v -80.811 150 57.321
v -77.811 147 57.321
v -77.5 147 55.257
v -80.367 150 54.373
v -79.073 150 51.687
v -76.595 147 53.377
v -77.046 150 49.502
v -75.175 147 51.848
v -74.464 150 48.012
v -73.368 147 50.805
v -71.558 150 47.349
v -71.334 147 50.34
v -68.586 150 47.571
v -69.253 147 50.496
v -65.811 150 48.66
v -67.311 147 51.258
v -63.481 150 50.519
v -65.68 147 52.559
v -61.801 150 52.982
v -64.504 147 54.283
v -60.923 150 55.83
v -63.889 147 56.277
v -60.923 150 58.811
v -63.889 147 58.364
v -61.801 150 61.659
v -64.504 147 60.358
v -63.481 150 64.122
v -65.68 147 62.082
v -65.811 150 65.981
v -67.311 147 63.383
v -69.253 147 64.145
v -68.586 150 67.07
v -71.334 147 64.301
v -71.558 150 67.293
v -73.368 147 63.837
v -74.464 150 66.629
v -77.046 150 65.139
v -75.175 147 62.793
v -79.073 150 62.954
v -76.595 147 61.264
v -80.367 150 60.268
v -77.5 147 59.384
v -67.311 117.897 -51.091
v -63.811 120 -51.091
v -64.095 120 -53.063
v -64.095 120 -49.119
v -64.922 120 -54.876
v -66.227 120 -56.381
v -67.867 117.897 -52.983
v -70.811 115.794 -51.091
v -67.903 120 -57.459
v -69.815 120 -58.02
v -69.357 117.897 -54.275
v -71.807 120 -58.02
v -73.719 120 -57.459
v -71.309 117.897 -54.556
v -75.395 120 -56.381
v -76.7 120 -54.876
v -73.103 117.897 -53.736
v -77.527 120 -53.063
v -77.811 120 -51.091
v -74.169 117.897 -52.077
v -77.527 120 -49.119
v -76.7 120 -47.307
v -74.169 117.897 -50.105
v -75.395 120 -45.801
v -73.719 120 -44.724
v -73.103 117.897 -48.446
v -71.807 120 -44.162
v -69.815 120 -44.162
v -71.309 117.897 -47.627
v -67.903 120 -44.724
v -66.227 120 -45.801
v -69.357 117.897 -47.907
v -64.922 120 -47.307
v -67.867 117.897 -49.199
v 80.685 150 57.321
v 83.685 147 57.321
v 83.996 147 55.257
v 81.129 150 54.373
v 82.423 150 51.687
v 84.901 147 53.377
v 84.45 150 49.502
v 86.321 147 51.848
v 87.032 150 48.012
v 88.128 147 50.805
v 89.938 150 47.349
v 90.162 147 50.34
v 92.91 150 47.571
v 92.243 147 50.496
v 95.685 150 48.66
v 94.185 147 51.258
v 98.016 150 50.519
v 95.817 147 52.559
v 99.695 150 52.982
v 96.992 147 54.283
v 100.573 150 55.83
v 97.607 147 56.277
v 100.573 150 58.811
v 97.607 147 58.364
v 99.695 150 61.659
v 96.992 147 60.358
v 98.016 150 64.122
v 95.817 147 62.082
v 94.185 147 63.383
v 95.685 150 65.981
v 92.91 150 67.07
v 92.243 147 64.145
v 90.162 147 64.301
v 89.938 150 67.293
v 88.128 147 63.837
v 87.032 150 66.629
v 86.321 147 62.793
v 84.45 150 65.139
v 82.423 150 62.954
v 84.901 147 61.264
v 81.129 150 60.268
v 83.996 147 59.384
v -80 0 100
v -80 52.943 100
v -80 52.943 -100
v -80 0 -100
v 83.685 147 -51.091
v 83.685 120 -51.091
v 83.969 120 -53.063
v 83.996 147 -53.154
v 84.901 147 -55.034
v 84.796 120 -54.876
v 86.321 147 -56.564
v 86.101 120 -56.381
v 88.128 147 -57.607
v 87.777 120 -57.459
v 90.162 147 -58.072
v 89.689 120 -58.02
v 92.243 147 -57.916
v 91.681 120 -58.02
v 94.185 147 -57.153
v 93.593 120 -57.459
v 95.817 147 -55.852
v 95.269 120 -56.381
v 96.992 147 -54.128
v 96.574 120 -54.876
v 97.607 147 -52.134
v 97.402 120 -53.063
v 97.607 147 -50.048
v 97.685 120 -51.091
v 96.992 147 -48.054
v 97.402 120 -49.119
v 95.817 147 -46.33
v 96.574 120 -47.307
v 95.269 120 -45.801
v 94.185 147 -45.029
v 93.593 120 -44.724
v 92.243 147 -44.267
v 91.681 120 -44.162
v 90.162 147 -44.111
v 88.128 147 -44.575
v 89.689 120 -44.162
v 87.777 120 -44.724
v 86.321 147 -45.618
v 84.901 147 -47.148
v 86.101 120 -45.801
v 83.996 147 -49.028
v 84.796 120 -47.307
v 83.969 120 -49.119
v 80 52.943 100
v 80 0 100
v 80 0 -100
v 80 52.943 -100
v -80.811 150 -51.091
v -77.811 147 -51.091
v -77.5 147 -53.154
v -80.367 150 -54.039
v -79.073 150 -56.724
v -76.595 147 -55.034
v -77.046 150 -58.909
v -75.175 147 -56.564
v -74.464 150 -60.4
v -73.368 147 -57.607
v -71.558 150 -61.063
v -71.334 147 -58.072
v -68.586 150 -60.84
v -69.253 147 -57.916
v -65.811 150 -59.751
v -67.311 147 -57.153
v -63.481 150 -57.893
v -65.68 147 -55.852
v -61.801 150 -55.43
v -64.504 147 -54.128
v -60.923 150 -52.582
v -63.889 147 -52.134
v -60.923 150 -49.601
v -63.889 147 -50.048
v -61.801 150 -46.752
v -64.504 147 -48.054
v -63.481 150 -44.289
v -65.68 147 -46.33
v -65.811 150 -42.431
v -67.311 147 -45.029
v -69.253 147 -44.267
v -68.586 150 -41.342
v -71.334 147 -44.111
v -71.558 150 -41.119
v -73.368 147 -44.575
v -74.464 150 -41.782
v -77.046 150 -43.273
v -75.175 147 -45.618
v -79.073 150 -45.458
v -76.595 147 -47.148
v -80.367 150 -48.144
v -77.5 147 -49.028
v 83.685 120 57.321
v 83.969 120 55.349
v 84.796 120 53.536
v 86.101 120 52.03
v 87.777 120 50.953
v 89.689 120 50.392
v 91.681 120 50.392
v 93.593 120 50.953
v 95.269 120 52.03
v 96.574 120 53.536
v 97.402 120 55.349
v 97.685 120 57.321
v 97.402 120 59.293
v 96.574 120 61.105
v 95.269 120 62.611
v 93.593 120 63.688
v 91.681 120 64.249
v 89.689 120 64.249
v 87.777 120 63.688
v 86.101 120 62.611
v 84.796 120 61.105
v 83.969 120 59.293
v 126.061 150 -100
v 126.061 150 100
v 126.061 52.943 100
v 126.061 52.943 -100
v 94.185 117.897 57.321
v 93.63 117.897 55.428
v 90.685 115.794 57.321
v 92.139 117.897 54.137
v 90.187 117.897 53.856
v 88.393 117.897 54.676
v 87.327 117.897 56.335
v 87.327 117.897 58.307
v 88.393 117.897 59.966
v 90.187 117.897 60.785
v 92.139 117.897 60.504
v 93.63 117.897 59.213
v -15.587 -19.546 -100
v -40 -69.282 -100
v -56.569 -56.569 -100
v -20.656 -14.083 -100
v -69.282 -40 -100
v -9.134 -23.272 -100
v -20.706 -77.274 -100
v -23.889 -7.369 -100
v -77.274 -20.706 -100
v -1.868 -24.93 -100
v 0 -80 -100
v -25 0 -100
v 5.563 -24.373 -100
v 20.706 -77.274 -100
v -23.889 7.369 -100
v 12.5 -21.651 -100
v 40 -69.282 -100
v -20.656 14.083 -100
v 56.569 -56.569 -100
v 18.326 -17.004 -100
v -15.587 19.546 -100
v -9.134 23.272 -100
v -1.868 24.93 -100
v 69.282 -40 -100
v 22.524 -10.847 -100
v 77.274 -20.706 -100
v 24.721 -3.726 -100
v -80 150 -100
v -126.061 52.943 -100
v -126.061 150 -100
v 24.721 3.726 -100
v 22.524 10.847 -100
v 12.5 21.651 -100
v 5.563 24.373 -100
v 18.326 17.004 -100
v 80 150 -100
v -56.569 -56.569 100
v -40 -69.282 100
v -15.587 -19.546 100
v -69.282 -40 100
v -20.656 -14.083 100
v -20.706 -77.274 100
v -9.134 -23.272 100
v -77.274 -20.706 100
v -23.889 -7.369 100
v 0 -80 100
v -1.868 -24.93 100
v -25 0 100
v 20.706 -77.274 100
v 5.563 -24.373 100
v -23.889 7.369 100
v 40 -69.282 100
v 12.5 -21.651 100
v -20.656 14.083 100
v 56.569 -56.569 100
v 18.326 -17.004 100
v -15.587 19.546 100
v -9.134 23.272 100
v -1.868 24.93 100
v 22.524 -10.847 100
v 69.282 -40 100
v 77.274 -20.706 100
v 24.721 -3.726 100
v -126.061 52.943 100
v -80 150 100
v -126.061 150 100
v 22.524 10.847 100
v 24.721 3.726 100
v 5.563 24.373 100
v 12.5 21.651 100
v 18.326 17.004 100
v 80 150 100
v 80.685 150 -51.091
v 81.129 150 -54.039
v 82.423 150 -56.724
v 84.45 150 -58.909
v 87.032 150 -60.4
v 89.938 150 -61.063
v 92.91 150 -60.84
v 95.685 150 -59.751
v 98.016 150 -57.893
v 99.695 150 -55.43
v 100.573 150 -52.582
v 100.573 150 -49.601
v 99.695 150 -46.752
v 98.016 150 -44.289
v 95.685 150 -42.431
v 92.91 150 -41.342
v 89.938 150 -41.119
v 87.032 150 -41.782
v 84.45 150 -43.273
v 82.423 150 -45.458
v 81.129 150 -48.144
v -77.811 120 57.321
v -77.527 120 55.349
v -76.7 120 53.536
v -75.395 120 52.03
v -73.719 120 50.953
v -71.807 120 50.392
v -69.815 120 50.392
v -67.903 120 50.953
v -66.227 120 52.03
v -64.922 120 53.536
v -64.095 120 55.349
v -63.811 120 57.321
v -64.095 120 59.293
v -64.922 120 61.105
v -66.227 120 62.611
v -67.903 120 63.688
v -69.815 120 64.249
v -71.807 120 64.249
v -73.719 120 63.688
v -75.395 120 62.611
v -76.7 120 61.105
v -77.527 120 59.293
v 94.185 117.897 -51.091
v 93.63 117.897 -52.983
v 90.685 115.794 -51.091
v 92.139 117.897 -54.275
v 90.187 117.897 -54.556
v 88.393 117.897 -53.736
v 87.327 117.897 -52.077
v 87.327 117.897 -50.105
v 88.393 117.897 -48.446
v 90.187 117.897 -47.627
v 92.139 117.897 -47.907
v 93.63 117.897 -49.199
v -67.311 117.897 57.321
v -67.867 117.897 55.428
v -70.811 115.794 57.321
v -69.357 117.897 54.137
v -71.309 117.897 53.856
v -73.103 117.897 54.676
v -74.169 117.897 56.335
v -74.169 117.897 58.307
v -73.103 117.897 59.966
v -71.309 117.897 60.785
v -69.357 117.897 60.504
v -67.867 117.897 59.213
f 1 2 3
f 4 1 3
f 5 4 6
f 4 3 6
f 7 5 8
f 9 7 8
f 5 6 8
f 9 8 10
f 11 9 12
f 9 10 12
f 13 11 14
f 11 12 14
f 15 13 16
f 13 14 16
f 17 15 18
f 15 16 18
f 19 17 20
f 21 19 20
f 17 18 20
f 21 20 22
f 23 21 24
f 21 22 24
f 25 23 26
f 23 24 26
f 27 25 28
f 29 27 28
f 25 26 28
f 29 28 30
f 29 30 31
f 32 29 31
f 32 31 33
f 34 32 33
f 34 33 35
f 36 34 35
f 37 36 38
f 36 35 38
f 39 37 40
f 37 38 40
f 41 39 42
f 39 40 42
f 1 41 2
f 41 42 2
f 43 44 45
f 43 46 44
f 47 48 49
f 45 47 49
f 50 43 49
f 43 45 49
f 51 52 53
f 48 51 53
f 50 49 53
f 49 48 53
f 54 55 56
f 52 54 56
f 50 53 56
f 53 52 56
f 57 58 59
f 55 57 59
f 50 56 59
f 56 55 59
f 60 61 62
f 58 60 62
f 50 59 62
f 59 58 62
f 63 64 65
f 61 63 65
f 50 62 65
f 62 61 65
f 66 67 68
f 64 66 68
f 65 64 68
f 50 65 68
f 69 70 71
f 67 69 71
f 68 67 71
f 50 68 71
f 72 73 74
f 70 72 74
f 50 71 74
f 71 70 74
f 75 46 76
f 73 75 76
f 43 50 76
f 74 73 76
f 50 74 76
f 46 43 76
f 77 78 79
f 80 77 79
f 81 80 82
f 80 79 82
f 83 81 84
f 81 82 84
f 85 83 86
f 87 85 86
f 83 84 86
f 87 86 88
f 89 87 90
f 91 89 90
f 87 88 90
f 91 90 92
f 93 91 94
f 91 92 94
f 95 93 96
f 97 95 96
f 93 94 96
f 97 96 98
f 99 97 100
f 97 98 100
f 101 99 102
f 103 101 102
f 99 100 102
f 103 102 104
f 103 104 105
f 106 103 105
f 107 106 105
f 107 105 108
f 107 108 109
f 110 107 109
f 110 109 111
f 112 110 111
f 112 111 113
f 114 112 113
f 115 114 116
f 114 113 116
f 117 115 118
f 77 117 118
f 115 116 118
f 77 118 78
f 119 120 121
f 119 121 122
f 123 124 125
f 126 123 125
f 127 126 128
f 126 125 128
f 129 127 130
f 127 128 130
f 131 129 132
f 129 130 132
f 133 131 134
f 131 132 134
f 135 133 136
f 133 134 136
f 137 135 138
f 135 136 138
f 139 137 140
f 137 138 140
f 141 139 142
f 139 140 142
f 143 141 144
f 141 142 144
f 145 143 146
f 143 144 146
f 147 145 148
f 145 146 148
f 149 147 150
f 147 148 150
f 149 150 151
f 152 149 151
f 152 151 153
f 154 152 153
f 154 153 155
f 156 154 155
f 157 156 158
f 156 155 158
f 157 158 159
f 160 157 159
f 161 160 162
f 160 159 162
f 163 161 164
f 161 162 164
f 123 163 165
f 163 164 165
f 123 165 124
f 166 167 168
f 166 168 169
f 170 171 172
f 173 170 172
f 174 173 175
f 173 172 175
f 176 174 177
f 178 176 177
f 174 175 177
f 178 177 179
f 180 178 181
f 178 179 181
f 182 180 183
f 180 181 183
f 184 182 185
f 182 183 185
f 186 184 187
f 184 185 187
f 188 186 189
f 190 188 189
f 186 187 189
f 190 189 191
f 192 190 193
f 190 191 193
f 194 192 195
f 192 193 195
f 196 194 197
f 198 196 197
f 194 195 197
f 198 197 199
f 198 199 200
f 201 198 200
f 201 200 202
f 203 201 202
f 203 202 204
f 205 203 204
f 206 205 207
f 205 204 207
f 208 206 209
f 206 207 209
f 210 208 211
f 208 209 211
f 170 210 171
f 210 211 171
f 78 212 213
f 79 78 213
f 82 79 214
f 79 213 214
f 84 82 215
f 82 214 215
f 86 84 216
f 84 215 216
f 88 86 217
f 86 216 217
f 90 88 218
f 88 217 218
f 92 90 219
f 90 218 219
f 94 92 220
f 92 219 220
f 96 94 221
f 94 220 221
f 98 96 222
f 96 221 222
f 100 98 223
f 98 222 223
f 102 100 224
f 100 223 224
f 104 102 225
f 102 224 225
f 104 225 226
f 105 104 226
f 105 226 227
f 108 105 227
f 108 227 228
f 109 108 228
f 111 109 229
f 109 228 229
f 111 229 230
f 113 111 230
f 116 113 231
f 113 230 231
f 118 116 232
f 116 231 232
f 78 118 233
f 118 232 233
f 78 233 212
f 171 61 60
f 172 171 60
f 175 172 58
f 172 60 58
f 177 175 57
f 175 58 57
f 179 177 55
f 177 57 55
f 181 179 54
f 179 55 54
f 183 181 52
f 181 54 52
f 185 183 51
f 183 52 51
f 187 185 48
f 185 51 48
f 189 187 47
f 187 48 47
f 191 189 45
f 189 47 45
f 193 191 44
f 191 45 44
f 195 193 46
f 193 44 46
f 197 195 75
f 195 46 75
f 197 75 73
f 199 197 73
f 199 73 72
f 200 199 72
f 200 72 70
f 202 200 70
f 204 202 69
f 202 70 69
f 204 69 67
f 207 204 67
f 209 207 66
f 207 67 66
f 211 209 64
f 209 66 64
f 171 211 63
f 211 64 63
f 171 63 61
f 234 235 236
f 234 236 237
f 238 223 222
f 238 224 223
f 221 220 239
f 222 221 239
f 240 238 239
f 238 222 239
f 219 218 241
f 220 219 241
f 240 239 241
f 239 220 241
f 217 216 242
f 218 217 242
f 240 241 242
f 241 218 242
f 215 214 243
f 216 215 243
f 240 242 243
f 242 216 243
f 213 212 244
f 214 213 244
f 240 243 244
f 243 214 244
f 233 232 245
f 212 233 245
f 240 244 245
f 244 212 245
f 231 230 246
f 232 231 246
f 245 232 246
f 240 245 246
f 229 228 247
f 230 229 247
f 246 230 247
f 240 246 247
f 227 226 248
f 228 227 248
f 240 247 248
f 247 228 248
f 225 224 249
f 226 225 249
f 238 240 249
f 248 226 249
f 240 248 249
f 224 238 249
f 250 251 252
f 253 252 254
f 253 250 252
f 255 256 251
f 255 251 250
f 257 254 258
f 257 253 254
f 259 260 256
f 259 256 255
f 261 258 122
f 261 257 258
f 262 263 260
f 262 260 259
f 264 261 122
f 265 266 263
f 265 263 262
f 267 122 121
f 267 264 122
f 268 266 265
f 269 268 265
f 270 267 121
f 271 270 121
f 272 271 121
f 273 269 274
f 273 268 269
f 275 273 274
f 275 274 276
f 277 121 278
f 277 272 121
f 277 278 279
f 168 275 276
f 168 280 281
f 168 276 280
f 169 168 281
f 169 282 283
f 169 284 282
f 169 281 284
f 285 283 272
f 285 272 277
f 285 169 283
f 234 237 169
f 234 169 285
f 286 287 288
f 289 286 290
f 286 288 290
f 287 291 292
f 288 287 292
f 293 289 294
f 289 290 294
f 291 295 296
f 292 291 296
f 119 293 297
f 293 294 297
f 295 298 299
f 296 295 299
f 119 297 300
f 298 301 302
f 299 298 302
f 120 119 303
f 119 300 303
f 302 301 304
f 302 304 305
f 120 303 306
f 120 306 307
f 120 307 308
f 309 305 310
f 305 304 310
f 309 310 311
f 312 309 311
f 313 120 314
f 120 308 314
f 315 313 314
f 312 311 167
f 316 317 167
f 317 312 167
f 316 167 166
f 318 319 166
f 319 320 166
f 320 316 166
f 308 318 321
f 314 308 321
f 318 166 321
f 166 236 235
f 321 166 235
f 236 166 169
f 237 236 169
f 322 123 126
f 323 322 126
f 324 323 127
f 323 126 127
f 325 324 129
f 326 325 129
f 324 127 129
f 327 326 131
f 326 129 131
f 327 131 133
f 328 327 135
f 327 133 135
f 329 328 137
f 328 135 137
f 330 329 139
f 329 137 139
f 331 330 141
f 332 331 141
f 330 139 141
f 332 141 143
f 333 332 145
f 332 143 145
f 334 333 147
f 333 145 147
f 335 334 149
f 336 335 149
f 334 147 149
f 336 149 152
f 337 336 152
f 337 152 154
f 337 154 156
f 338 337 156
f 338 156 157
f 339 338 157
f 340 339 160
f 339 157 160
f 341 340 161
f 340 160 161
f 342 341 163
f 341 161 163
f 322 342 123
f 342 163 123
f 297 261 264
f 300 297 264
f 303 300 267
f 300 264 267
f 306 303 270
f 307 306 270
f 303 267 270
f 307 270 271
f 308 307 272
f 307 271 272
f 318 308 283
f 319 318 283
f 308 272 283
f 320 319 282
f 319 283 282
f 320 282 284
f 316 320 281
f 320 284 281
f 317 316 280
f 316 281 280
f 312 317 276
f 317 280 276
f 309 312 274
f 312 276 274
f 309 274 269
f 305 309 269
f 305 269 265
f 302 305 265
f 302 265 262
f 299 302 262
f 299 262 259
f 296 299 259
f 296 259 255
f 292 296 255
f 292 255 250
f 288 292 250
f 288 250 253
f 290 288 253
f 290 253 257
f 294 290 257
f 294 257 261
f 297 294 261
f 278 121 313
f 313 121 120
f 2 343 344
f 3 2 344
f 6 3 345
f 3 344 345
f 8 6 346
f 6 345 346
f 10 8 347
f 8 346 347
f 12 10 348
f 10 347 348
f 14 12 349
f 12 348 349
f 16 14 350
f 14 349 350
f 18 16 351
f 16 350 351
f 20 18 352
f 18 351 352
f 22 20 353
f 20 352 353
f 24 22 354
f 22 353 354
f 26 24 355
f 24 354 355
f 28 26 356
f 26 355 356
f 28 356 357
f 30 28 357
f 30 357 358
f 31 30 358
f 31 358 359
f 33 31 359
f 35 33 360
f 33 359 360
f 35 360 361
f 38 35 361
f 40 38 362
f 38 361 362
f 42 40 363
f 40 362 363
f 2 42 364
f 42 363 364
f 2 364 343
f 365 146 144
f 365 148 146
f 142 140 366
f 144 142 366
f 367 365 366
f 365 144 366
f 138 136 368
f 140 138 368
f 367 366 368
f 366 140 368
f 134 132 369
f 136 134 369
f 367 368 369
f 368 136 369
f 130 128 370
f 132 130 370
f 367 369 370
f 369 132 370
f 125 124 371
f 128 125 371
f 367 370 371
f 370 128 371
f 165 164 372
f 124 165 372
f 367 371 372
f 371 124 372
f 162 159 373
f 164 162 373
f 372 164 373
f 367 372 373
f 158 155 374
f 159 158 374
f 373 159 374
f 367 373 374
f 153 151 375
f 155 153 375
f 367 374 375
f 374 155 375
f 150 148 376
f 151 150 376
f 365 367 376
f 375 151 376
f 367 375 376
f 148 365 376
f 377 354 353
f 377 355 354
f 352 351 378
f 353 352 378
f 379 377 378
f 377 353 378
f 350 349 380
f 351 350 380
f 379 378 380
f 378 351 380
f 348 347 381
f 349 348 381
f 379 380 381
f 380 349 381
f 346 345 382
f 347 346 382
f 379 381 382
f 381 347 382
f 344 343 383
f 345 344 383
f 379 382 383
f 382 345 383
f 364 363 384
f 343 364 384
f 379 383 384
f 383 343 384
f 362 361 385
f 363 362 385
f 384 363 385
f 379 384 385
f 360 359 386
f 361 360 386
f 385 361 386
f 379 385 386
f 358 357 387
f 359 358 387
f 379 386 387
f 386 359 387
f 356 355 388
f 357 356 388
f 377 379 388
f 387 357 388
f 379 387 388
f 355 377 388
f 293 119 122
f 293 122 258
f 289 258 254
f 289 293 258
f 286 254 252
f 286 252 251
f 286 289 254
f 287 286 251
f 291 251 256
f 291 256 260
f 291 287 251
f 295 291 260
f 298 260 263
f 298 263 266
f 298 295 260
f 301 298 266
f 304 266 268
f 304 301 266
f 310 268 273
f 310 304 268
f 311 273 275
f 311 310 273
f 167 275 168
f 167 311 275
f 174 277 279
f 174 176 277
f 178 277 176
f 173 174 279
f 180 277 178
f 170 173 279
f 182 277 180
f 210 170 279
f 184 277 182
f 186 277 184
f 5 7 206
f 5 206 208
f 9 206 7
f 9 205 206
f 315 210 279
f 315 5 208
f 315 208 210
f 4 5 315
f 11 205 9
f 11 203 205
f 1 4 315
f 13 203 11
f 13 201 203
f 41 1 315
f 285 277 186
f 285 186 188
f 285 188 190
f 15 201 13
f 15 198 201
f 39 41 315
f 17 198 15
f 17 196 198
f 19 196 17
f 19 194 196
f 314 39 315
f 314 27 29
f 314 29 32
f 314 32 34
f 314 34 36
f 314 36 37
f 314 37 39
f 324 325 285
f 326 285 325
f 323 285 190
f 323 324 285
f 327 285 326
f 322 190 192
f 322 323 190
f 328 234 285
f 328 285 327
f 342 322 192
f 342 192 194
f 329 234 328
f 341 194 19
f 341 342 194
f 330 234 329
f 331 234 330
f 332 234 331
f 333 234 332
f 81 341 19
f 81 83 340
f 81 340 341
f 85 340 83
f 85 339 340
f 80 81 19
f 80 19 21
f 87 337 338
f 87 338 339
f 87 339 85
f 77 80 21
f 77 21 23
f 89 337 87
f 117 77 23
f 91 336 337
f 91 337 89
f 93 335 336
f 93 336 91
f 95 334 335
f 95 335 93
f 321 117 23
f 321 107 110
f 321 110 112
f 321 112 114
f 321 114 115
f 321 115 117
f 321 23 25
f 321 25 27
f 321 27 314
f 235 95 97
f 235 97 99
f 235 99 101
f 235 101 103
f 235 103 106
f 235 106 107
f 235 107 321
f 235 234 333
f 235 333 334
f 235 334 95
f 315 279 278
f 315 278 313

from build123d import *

# Parameters (mm, degrees)
EXTRUDE_1_DEPTH     = 200
SKETCH_2_W          = 200
SKETCH_2_H          = 97.057417657
EXTRUDE_2_DEPTH     = 46.061398085
SKETCH_3_W          = 200
SKETCH_3_H          = 97.057417639
EXTRUDE_3_DEPTH     = 46.061398049
HOLE_WIZARD_1_D     = 50
HOLE_WIZARD_2_D     = 14
HOLE_WIZARD_2_DEPTH = 30
HOLE_WIZARD_2_TIP   = 4.206024333
CHAMFER_1_SIZE      = 3


with BuildPart() as part:
    # 草图1 → 凸台-拉伸1 (new body)
    with BuildSketch(Plane.XY.offset(100)):
        with BuildLine():
            Line((80.000000036, 0), (80.000000036, 150))
            Line((80.000000036, 150), (-80.000000036, 150))
            Line((-80.000000036, 150), (-80.000000036, 0))
            ThreePointArc((-80.000000036, 0), (0, -80.000000036), (80.000000036, 0))
        make_face()
    extrude(amount=-EXTRUDE_1_DEPTH)

    # 草图2 → 凸台-拉伸2 (add)
    with BuildSketch(Plane(origin=(80.000000036, 0, 0), x_dir=(0, 0, -1), z_dir=(1, 0, 0))):
        with Locations((0, 101.471291153)):
            Rectangle(SKETCH_2_W, SKETCH_2_H)
    extrude(amount=EXTRUDE_2_DEPTH)

    # 草图3 → 凸台-拉伸3 (add)
    with BuildSketch(Plane.ZY.offset(80.000000036)):
        with Locations((0, 101.471291181)):
            Rectangle(SKETCH_3_W, SKETCH_3_H)
    extrude(amount=EXTRUDE_3_DEPTH)

    # 孔1 (through all)
    with Locations(Plane.XY.offset(100)):
        with Locations((0, 0)):
            Hole(HOLE_WIZARD_1_D / 2)

    # 孔2
    with Locations(Plane(origin=(0, 150, 0), x_dir=(1, 0, 0), z_dir=(0, 1, 0))):
        with Locations((-70.811035645, 51.091167344), (-70.811035645, -57.320629237), (90.685157882, -57.320629237), (90.685157882, 51.091167344)):
            Hole(HOLE_WIZARD_2_D / 2, depth=HOLE_WIZARD_2_DEPTH)
            with Locations((0, 0, -(HOLE_WIZARD_2_DEPTH + HOLE_WIZARD_2_TIP / 2))):  # 118° drill point
                Cone(0, HOLE_WIZARD_2_D / 2, HOLE_WIZARD_2_TIP, mode=Mode.SUBTRACT)

    # 倒角1
    chamfer_1_edges = [part.edges().sort_by_distance(p)[0] for p in [
        (97.685157882, 150, -51.091167344),
        (97.685157882, 150, 57.320629237),
        (-63.811035645, 150, 57.320629237),
        (-63.811035645, 150, -51.091167344),
    ]]
    chamfer(chamfer_1_edges, length=CHAMFER_1_SIZE)


solid = part.part
